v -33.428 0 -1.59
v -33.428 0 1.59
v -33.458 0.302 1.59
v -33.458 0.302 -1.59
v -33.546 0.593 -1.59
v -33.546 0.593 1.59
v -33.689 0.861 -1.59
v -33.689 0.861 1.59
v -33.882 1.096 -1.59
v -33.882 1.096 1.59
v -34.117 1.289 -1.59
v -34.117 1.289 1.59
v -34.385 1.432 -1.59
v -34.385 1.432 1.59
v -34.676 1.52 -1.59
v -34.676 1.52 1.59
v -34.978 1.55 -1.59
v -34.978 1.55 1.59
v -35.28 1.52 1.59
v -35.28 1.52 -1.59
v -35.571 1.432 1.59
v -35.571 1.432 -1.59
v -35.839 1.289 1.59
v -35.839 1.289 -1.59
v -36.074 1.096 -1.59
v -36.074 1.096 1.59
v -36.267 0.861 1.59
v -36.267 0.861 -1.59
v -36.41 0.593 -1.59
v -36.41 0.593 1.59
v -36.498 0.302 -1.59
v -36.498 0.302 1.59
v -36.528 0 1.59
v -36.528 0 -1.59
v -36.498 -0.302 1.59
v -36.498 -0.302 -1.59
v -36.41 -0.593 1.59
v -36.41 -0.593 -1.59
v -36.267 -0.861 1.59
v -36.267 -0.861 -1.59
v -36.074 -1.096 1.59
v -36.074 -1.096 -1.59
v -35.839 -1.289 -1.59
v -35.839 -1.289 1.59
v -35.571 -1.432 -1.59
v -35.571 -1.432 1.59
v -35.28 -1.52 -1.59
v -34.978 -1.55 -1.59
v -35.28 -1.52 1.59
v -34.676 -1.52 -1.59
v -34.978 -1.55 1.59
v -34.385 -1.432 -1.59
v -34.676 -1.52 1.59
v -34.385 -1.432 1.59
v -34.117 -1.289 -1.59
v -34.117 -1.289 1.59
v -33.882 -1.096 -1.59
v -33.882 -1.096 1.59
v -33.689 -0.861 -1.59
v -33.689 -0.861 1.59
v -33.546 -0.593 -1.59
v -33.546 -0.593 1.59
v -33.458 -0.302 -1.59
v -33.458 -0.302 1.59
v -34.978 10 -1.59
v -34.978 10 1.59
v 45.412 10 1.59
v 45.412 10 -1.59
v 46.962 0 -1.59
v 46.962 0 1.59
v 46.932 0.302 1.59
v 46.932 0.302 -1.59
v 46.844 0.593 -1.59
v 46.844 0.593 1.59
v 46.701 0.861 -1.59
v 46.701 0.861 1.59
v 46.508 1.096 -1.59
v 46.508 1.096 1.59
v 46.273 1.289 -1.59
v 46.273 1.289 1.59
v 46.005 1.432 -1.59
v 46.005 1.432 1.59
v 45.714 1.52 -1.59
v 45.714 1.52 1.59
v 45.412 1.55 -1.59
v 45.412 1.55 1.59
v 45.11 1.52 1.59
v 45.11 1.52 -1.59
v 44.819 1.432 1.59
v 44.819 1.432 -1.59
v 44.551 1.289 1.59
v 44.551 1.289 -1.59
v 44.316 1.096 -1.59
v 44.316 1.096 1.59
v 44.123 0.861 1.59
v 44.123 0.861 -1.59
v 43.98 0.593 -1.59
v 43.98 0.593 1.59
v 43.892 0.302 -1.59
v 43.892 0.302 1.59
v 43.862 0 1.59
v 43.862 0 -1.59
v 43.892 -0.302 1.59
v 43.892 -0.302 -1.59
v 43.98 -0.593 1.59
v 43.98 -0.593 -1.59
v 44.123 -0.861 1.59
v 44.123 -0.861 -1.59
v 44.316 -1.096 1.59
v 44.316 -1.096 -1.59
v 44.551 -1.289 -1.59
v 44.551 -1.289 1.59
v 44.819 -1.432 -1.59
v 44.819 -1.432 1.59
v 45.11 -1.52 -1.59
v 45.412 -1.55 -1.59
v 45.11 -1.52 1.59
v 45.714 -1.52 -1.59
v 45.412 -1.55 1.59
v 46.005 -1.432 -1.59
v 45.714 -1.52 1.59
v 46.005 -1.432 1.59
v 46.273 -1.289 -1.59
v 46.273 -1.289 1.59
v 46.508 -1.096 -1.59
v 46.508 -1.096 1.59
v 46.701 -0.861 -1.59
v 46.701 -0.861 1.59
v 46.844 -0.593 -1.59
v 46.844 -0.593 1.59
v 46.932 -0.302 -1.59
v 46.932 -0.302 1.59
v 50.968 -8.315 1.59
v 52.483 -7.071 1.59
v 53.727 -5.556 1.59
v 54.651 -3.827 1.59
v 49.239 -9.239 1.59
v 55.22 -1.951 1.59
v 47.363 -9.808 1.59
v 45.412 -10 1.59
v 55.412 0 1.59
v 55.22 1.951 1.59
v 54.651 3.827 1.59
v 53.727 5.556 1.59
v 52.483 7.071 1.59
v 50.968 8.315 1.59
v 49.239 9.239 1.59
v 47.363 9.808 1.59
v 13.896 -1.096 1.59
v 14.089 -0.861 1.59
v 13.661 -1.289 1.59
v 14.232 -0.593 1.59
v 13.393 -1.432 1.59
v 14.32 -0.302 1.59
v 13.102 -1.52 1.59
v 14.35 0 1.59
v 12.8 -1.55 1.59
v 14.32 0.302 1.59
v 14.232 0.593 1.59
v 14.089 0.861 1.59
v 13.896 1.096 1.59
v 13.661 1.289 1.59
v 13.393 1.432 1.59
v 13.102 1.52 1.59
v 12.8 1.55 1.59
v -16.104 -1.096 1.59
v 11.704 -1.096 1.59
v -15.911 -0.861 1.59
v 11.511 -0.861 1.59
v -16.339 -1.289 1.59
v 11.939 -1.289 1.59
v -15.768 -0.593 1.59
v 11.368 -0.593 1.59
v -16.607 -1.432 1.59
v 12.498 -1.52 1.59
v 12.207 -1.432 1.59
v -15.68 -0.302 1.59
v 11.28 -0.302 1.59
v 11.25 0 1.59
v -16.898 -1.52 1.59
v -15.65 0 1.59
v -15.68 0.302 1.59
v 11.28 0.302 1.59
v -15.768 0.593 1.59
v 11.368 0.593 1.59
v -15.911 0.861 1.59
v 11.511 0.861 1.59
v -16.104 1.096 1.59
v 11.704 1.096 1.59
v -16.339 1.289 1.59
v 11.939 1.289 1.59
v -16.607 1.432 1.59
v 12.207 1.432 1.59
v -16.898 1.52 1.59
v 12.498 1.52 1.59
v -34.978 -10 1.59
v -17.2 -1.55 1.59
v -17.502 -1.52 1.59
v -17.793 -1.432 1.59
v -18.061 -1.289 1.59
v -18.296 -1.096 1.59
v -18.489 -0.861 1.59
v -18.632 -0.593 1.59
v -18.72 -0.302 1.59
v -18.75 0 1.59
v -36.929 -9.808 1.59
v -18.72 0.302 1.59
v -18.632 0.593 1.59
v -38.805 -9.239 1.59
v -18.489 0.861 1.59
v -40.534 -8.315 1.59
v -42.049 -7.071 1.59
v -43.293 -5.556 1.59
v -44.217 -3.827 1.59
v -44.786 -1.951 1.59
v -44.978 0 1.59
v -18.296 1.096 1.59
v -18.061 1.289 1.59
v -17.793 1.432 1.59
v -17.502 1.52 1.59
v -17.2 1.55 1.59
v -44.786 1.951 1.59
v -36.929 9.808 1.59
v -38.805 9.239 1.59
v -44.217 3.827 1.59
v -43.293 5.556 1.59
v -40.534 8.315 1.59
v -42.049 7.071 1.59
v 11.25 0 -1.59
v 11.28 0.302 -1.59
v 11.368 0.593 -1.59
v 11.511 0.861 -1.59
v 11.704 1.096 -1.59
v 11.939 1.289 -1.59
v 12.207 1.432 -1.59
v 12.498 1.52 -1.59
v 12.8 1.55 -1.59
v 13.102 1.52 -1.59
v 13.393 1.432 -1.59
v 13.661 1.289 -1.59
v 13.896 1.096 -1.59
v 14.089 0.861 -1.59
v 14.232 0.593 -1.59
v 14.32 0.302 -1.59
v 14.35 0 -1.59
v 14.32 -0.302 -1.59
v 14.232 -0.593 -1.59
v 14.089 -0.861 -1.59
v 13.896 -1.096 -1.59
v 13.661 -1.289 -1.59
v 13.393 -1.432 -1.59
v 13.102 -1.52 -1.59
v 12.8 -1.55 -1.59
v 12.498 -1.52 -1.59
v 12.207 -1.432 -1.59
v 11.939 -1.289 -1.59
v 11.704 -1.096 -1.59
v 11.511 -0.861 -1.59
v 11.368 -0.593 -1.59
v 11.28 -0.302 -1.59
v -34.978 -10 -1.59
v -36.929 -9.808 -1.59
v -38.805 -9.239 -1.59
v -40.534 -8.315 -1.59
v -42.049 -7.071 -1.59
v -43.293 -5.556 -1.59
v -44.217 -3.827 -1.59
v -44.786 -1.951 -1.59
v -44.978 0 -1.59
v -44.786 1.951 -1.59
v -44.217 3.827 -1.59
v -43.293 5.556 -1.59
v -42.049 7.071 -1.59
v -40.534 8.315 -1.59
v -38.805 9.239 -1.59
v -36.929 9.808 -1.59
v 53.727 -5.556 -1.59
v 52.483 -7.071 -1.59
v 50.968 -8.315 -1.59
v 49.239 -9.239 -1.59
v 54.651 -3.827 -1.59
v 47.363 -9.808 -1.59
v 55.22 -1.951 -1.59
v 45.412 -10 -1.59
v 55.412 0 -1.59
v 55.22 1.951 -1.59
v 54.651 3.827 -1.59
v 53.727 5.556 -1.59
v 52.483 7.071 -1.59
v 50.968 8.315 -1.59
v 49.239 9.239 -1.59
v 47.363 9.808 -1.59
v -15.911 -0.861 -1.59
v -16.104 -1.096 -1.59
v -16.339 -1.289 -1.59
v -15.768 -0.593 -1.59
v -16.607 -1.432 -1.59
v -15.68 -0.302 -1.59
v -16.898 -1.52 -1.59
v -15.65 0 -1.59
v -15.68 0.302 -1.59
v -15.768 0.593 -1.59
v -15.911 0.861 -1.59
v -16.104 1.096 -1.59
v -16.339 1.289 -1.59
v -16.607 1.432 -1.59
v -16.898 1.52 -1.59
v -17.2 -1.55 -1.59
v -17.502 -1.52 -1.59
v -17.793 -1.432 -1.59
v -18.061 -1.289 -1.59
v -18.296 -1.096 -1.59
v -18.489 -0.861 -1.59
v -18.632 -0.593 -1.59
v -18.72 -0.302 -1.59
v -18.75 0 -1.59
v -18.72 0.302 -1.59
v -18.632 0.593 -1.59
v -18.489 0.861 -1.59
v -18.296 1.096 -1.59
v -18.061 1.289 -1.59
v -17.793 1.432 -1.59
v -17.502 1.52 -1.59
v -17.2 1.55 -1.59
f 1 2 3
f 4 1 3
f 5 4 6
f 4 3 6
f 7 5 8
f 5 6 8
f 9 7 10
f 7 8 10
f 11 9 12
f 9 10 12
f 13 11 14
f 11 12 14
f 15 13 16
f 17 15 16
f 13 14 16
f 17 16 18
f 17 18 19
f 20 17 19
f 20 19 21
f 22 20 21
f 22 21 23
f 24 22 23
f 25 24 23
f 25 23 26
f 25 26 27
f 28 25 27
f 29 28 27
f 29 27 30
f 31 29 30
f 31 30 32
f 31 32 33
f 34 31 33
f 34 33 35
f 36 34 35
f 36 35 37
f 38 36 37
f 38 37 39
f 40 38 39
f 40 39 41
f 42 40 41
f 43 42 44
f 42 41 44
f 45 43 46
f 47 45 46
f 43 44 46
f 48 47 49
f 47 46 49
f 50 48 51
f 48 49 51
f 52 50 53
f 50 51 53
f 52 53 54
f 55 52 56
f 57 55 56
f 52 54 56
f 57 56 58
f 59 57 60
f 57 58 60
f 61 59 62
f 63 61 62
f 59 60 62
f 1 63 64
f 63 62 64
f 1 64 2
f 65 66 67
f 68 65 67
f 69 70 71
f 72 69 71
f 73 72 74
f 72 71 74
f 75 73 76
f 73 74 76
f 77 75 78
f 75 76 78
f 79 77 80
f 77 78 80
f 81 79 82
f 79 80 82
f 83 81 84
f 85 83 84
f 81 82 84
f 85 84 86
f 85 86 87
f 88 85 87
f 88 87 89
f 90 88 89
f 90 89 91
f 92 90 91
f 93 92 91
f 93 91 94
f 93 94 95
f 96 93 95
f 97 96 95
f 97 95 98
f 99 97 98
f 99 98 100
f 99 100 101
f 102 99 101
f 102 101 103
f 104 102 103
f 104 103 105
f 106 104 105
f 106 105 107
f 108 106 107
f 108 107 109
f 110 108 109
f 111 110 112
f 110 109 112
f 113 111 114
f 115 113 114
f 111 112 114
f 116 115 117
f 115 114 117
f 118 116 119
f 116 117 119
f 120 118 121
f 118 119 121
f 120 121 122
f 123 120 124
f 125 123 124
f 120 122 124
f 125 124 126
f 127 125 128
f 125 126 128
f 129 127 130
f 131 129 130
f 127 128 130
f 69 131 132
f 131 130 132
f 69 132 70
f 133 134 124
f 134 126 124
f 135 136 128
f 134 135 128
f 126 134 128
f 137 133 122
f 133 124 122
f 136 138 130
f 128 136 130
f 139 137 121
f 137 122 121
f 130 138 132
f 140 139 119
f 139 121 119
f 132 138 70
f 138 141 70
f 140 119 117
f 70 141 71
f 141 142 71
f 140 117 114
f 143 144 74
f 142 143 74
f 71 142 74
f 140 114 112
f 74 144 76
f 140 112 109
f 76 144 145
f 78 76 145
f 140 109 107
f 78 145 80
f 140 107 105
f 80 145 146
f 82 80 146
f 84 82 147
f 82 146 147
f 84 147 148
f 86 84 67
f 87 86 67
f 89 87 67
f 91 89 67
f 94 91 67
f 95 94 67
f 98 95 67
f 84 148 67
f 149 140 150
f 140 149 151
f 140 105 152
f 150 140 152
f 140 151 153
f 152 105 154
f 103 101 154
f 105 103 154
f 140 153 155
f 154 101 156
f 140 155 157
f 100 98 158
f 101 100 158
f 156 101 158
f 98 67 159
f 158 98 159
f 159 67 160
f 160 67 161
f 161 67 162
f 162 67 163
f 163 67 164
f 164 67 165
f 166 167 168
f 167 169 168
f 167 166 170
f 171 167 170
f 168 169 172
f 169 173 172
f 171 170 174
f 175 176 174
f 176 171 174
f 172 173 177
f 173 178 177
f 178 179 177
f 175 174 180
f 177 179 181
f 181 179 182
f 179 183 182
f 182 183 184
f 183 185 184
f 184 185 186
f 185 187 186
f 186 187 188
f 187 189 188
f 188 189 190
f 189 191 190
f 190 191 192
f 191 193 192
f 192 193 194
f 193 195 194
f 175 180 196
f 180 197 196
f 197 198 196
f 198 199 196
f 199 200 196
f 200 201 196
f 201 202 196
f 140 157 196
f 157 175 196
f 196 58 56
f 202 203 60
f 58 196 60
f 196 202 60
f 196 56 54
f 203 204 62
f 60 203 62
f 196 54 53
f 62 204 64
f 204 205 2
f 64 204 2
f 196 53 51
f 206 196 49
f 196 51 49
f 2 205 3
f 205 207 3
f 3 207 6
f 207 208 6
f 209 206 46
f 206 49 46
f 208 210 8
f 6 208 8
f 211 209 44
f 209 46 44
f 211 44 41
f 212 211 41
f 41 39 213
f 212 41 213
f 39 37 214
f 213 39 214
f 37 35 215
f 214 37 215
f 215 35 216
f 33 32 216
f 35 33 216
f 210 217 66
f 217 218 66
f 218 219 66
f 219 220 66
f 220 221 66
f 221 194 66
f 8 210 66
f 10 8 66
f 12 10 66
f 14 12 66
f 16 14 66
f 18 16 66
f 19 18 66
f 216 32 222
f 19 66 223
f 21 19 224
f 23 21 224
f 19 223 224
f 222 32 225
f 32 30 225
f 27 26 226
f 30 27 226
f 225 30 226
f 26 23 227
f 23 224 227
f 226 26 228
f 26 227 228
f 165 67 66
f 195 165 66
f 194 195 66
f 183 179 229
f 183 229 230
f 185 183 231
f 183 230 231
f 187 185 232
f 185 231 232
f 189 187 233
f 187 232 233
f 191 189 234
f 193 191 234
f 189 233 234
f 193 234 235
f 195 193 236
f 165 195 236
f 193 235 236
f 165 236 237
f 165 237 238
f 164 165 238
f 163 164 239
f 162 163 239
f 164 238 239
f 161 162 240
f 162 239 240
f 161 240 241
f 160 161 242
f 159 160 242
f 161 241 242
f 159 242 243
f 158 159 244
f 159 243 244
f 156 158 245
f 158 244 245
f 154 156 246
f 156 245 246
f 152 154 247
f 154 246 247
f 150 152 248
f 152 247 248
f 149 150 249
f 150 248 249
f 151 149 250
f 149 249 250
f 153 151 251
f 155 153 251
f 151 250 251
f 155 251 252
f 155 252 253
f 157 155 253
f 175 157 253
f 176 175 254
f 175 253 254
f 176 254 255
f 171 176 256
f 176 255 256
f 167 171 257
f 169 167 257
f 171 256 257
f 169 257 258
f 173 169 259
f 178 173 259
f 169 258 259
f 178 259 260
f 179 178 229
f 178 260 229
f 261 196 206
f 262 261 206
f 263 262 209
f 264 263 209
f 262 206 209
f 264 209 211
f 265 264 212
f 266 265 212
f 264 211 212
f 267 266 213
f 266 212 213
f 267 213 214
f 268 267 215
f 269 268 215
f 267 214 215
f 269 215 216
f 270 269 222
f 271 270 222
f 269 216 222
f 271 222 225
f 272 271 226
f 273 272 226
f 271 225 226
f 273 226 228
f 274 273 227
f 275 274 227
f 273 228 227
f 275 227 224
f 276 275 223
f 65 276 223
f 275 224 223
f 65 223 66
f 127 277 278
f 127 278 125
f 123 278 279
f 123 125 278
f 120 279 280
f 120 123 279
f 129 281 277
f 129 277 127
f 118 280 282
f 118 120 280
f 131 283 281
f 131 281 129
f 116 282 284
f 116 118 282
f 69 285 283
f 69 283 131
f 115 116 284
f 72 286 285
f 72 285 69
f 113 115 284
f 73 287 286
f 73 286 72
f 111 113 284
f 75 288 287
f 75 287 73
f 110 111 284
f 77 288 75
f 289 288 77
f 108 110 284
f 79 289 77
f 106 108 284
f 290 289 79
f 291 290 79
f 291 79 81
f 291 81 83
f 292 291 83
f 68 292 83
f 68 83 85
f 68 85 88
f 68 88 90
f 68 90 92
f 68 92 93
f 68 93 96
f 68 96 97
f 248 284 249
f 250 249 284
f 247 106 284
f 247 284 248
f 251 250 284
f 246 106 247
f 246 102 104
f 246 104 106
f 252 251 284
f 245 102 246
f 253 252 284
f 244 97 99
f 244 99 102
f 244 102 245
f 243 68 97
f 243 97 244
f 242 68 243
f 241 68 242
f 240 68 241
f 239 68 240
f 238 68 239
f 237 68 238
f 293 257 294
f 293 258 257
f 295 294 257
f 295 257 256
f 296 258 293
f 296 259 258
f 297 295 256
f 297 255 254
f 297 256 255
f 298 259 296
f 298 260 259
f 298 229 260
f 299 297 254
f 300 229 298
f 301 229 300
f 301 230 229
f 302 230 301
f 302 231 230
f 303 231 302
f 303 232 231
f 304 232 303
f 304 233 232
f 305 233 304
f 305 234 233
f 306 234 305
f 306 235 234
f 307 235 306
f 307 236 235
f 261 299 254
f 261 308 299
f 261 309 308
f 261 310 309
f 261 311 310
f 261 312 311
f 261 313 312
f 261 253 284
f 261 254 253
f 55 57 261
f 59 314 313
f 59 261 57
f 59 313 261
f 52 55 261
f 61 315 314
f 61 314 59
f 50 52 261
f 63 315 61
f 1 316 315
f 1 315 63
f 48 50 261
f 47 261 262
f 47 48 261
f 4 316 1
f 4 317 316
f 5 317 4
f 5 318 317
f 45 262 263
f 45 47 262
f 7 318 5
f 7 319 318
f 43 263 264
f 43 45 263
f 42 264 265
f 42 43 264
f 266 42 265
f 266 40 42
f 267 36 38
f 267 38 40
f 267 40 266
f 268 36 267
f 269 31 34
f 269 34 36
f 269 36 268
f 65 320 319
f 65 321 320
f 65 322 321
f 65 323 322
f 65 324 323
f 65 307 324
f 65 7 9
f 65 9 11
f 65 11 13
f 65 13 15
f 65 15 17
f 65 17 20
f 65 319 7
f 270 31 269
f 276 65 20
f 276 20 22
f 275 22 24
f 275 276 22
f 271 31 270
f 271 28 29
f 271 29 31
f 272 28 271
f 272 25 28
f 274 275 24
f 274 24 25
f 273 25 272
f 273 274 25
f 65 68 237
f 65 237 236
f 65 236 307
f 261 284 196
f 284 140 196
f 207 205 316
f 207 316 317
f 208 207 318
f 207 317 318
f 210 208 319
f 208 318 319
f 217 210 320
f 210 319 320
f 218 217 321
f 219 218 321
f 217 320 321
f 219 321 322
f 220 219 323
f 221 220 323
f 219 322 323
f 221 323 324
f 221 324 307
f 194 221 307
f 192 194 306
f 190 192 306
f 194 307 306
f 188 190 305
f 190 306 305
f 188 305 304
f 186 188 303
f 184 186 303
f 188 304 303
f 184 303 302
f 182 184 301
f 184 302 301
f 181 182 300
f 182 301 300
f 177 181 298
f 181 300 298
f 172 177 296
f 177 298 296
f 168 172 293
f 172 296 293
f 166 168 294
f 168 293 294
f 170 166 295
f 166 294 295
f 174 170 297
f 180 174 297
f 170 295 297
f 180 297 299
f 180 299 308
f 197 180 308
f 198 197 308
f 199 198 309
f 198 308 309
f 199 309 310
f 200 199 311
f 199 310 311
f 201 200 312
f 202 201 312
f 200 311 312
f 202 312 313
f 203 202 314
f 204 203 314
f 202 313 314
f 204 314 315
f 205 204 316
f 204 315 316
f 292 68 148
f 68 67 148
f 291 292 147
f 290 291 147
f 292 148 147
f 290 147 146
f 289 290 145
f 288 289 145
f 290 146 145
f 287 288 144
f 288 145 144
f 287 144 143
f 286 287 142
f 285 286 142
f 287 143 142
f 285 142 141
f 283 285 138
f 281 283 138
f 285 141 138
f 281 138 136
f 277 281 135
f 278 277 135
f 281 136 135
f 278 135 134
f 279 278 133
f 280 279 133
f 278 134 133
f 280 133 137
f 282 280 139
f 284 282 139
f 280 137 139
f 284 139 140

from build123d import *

# Parameters (mm, degrees)
BOSS_EXTRUDE1_DEPTH = 1.59
SKETCH6_R           = 1.55
CUT_EXTRUDE3_DEPTH  = 48.669302491
LPATTERN3_COUNT     = 3
LPATTERN3_PITCH     = 30
BOSS_EXTRUDE2_DEPTH = 1.59
SKETCH11_R          = 1.55
CUT_EXTRUDE7_DEPTH  = 57.396830198
SKETCH31_R          = 1.55
CUT_EXTRUDE14_DEPTH = 57.396830198


with BuildPart() as part:
    # Sketch1 → Boss-Extrude1 (new, symmetric)
    with BuildSketch(Plane.XY):
        with BuildLine():
            Line((-34.977997181, 10), (45.412002819, 10))
            ThreePointArc((45.412002819, 10), (46.5, 0), (45.412002819, -10))
            Line((45.412002819, -10), (-34.977997181, -10))
            ThreePointArc((-34.977997181, -10), (-44.977997181, 0), (-34.977997181, 10))
        make_face()
    extrude(amount=BOSS_EXTRUDE1_DEPTH, both=True)

    # Sketch6 → Cut-Extrude3 (cut, symmetric)
    with BuildSketch(Plane(origin=(0, 0, -1.59), x_dir=(-1, 0, 0), z_dir=(0, 0, -1))):
        with Locations((-12.8, 0)):
            Circle(SKETCH6_R)
    cut_extrude3 = extrude(amount=CUT_EXTRUDE3_DEPTH, both=True, mode=Mode.SUBTRACT)

    # LPattern3: Cut-Extrude3 ×3
    with Locations(*[(-i * LPATTERN3_PITCH, 0, 0) for i in range(1, LPATTERN3_COUNT)]):
        add(cut_extrude3, mode=Mode.SUBTRACT)

    # Sketch22 → Boss-Extrude2 (add, symmetric)
    with BuildSketch(Plane.XY):
        with BuildLine():
            ThreePointArc((45.412002819, -10), (46.5, 0), (45.412002819, 10))
            ThreePointArc((45.412002819, 10), (55.412002819, 0), (45.412002819, -10))
        make_face()
    extrude(amount=BOSS_EXTRUDE2_DEPTH, both=True)

    # Sketch11 → Cut-Extrude7 (cut, through all)
    with BuildSketch(Plane.XY.offset(1.59)):
        with Locations((-96.957997181, 0)):
            Circle(SKETCH11_R)
        with Locations((45.412002819, 0)):
            Circle(SKETCH11_R)
    extrude(amount=-CUT_EXTRUDE7_DEPTH, mode=Mode.SUBTRACT)

    # Sketch31 → Cut-Extrude14 (cut, through all)
    with BuildSketch(Plane.XY.offset(1.59)):
        with Locations((-34.977997181, 0)):
            Circle(SKETCH31_R)
    extrude(amount=-CUT_EXTRUDE14_DEPTH, mode=Mode.SUBTRACT)


solid = part.part
